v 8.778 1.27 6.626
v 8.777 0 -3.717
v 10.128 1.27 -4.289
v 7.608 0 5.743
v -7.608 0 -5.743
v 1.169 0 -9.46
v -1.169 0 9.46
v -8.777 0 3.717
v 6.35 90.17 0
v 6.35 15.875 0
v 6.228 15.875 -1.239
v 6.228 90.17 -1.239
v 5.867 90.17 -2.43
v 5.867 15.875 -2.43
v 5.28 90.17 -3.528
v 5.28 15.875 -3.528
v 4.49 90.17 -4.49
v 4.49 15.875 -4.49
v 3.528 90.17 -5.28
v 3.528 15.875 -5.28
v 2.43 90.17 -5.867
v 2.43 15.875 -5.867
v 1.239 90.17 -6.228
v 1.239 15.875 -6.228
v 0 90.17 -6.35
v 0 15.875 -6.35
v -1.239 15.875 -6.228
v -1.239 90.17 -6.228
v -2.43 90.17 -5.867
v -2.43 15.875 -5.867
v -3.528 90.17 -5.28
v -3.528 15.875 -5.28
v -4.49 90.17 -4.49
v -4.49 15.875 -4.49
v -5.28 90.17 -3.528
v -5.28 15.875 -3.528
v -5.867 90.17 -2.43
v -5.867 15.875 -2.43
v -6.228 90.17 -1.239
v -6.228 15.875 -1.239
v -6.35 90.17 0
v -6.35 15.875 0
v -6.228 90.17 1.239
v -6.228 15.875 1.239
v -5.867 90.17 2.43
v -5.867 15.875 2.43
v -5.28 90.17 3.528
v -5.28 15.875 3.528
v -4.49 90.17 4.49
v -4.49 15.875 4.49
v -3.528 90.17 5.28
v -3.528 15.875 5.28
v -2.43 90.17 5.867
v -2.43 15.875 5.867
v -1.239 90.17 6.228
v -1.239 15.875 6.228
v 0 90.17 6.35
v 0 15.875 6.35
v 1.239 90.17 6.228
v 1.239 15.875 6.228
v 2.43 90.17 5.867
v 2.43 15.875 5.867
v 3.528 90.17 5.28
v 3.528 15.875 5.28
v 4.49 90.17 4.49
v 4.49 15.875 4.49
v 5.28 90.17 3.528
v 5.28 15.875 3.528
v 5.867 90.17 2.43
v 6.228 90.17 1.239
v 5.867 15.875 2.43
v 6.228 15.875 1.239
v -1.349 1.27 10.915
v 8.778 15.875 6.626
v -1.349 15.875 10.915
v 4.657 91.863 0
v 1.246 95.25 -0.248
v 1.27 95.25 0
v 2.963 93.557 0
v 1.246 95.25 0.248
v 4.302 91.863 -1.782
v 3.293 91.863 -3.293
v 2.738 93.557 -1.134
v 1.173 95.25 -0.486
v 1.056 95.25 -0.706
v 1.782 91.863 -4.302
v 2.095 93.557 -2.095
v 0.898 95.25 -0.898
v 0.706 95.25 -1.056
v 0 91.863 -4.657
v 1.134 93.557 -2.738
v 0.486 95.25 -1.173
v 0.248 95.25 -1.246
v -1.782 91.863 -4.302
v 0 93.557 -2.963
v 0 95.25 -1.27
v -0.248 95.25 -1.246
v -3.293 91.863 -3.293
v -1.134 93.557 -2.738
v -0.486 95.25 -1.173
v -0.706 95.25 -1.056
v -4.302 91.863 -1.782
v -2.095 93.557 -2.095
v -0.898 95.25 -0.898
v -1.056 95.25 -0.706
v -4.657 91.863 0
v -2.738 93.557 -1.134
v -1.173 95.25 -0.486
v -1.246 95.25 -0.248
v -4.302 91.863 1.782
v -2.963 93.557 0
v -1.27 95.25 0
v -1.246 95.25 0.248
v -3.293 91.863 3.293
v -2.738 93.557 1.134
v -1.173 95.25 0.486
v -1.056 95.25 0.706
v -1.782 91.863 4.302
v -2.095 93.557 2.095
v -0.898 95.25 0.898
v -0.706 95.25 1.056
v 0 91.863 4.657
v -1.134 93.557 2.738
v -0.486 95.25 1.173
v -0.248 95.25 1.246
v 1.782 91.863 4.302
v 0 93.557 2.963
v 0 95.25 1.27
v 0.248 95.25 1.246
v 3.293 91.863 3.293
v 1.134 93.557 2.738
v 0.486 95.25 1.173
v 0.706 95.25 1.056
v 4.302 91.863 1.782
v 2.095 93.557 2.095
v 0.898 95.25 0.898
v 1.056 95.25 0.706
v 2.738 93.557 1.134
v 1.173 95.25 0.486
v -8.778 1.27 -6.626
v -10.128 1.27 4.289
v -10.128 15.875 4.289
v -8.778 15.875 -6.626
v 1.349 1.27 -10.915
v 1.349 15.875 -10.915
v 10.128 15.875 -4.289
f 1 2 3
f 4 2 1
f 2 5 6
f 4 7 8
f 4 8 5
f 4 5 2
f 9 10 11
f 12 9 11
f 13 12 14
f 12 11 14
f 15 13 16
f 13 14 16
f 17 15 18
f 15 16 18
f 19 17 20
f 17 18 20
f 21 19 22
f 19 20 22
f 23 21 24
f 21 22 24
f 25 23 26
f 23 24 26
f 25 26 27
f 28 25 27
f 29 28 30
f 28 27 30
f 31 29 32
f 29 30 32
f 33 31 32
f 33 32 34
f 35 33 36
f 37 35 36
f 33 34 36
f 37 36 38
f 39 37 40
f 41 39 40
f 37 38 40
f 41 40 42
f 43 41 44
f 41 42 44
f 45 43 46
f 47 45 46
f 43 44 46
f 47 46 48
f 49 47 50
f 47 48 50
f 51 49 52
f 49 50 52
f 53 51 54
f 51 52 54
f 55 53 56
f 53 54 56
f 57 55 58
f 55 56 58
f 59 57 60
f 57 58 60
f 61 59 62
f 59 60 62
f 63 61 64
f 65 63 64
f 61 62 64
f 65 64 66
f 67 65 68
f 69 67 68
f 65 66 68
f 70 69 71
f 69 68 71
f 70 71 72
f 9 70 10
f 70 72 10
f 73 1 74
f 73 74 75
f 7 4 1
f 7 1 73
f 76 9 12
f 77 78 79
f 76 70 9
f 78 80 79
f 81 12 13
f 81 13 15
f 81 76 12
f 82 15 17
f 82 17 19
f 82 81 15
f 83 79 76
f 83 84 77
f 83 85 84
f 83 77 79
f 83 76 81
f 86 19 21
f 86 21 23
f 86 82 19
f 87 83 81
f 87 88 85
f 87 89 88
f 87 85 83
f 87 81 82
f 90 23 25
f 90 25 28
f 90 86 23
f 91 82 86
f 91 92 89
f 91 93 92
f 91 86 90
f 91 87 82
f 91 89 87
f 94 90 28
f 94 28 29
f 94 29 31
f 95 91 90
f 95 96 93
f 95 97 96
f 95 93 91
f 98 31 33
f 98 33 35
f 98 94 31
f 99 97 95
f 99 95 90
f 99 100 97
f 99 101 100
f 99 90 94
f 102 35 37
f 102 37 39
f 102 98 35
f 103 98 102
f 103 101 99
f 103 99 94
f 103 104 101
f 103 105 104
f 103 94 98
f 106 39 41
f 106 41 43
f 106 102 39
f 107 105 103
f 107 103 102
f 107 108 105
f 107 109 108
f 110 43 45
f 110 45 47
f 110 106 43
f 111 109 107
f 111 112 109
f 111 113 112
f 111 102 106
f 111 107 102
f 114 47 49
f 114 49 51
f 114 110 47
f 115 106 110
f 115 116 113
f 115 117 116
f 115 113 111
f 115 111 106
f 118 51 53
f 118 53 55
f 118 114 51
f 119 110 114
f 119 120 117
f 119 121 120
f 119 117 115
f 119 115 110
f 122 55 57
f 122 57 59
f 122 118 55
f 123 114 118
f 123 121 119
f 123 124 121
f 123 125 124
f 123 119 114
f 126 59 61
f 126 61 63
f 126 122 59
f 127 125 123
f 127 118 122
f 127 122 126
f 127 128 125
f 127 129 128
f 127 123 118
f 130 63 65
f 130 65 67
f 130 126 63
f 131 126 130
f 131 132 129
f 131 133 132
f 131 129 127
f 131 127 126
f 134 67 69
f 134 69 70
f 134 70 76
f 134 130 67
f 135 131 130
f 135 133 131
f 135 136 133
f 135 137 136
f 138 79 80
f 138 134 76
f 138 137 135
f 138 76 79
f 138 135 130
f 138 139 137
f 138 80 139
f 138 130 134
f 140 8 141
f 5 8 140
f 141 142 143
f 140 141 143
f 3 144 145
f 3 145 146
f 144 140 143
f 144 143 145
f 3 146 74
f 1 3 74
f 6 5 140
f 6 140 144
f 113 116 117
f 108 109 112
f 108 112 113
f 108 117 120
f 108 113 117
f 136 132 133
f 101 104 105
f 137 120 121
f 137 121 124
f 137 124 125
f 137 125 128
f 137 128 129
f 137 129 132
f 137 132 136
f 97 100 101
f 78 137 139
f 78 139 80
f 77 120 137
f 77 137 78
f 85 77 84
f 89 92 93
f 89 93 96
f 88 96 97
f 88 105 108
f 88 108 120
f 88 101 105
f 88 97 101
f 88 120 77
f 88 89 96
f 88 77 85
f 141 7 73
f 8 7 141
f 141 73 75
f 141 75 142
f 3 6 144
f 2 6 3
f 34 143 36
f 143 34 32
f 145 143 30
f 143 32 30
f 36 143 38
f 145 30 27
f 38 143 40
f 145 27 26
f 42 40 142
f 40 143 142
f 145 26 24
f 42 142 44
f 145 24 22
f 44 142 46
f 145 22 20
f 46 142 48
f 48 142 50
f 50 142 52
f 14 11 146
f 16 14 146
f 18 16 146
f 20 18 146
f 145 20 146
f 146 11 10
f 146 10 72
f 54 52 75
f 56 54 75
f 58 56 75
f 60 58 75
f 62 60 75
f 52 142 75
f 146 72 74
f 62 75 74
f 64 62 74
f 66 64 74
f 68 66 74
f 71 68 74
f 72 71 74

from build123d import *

# Parameters (mm, degrees)
F1_DEPTH = 15.875
F2_SIZE  = 1.27
F4_R     = 6.35
F5_DEPTH = 79.375
F6_SIZE  = 5.08


with BuildPart() as f1:
    # F0 (on Front) → F1 (new body)
    with BuildSketch(Plane.XZ):
        Polygon((-1.349322, 10.91544), (-10.127709, 4.289173), (-8.778387, -6.626267), (1.349322, -10.91544), (10.127709, -4.289173), (8.778387, 6.626267), align=None)
    extrude(amount=-F1_DEPTH)

    # F2
    f2_edges = [f1.edges().sort_by_distance(p)[0] for p in [
        (3.714533, 0, 8.770853),
        (-5.738515, 0, 7.602307),
        (-9.453048, 0, -1.168547),
        (-3.714533, 0, -8.770853),
        (5.738515, 0, -7.602307),
        (9.453048, 0, 1.168547),
    ]]
    chamfer(f2_edges, length=F2_SIZE)

    # F4 (on offset) → F5 (join)
    with BuildSketch(Plane(origin=(0, 15.875, 0), x_dir=(1, 0, 0), z_dir=(0, 1, 0))):
        Circle(F4_R)
    extrude(amount=F5_DEPTH)

    # F6
    f6_edges = [f1.edges().sort_by_distance(p)[0] for p in [
        (-6.35, 95.25, 0),
    ]]
    chamfer(f6_edges, length=F6_SIZE)


solid = f1.part
